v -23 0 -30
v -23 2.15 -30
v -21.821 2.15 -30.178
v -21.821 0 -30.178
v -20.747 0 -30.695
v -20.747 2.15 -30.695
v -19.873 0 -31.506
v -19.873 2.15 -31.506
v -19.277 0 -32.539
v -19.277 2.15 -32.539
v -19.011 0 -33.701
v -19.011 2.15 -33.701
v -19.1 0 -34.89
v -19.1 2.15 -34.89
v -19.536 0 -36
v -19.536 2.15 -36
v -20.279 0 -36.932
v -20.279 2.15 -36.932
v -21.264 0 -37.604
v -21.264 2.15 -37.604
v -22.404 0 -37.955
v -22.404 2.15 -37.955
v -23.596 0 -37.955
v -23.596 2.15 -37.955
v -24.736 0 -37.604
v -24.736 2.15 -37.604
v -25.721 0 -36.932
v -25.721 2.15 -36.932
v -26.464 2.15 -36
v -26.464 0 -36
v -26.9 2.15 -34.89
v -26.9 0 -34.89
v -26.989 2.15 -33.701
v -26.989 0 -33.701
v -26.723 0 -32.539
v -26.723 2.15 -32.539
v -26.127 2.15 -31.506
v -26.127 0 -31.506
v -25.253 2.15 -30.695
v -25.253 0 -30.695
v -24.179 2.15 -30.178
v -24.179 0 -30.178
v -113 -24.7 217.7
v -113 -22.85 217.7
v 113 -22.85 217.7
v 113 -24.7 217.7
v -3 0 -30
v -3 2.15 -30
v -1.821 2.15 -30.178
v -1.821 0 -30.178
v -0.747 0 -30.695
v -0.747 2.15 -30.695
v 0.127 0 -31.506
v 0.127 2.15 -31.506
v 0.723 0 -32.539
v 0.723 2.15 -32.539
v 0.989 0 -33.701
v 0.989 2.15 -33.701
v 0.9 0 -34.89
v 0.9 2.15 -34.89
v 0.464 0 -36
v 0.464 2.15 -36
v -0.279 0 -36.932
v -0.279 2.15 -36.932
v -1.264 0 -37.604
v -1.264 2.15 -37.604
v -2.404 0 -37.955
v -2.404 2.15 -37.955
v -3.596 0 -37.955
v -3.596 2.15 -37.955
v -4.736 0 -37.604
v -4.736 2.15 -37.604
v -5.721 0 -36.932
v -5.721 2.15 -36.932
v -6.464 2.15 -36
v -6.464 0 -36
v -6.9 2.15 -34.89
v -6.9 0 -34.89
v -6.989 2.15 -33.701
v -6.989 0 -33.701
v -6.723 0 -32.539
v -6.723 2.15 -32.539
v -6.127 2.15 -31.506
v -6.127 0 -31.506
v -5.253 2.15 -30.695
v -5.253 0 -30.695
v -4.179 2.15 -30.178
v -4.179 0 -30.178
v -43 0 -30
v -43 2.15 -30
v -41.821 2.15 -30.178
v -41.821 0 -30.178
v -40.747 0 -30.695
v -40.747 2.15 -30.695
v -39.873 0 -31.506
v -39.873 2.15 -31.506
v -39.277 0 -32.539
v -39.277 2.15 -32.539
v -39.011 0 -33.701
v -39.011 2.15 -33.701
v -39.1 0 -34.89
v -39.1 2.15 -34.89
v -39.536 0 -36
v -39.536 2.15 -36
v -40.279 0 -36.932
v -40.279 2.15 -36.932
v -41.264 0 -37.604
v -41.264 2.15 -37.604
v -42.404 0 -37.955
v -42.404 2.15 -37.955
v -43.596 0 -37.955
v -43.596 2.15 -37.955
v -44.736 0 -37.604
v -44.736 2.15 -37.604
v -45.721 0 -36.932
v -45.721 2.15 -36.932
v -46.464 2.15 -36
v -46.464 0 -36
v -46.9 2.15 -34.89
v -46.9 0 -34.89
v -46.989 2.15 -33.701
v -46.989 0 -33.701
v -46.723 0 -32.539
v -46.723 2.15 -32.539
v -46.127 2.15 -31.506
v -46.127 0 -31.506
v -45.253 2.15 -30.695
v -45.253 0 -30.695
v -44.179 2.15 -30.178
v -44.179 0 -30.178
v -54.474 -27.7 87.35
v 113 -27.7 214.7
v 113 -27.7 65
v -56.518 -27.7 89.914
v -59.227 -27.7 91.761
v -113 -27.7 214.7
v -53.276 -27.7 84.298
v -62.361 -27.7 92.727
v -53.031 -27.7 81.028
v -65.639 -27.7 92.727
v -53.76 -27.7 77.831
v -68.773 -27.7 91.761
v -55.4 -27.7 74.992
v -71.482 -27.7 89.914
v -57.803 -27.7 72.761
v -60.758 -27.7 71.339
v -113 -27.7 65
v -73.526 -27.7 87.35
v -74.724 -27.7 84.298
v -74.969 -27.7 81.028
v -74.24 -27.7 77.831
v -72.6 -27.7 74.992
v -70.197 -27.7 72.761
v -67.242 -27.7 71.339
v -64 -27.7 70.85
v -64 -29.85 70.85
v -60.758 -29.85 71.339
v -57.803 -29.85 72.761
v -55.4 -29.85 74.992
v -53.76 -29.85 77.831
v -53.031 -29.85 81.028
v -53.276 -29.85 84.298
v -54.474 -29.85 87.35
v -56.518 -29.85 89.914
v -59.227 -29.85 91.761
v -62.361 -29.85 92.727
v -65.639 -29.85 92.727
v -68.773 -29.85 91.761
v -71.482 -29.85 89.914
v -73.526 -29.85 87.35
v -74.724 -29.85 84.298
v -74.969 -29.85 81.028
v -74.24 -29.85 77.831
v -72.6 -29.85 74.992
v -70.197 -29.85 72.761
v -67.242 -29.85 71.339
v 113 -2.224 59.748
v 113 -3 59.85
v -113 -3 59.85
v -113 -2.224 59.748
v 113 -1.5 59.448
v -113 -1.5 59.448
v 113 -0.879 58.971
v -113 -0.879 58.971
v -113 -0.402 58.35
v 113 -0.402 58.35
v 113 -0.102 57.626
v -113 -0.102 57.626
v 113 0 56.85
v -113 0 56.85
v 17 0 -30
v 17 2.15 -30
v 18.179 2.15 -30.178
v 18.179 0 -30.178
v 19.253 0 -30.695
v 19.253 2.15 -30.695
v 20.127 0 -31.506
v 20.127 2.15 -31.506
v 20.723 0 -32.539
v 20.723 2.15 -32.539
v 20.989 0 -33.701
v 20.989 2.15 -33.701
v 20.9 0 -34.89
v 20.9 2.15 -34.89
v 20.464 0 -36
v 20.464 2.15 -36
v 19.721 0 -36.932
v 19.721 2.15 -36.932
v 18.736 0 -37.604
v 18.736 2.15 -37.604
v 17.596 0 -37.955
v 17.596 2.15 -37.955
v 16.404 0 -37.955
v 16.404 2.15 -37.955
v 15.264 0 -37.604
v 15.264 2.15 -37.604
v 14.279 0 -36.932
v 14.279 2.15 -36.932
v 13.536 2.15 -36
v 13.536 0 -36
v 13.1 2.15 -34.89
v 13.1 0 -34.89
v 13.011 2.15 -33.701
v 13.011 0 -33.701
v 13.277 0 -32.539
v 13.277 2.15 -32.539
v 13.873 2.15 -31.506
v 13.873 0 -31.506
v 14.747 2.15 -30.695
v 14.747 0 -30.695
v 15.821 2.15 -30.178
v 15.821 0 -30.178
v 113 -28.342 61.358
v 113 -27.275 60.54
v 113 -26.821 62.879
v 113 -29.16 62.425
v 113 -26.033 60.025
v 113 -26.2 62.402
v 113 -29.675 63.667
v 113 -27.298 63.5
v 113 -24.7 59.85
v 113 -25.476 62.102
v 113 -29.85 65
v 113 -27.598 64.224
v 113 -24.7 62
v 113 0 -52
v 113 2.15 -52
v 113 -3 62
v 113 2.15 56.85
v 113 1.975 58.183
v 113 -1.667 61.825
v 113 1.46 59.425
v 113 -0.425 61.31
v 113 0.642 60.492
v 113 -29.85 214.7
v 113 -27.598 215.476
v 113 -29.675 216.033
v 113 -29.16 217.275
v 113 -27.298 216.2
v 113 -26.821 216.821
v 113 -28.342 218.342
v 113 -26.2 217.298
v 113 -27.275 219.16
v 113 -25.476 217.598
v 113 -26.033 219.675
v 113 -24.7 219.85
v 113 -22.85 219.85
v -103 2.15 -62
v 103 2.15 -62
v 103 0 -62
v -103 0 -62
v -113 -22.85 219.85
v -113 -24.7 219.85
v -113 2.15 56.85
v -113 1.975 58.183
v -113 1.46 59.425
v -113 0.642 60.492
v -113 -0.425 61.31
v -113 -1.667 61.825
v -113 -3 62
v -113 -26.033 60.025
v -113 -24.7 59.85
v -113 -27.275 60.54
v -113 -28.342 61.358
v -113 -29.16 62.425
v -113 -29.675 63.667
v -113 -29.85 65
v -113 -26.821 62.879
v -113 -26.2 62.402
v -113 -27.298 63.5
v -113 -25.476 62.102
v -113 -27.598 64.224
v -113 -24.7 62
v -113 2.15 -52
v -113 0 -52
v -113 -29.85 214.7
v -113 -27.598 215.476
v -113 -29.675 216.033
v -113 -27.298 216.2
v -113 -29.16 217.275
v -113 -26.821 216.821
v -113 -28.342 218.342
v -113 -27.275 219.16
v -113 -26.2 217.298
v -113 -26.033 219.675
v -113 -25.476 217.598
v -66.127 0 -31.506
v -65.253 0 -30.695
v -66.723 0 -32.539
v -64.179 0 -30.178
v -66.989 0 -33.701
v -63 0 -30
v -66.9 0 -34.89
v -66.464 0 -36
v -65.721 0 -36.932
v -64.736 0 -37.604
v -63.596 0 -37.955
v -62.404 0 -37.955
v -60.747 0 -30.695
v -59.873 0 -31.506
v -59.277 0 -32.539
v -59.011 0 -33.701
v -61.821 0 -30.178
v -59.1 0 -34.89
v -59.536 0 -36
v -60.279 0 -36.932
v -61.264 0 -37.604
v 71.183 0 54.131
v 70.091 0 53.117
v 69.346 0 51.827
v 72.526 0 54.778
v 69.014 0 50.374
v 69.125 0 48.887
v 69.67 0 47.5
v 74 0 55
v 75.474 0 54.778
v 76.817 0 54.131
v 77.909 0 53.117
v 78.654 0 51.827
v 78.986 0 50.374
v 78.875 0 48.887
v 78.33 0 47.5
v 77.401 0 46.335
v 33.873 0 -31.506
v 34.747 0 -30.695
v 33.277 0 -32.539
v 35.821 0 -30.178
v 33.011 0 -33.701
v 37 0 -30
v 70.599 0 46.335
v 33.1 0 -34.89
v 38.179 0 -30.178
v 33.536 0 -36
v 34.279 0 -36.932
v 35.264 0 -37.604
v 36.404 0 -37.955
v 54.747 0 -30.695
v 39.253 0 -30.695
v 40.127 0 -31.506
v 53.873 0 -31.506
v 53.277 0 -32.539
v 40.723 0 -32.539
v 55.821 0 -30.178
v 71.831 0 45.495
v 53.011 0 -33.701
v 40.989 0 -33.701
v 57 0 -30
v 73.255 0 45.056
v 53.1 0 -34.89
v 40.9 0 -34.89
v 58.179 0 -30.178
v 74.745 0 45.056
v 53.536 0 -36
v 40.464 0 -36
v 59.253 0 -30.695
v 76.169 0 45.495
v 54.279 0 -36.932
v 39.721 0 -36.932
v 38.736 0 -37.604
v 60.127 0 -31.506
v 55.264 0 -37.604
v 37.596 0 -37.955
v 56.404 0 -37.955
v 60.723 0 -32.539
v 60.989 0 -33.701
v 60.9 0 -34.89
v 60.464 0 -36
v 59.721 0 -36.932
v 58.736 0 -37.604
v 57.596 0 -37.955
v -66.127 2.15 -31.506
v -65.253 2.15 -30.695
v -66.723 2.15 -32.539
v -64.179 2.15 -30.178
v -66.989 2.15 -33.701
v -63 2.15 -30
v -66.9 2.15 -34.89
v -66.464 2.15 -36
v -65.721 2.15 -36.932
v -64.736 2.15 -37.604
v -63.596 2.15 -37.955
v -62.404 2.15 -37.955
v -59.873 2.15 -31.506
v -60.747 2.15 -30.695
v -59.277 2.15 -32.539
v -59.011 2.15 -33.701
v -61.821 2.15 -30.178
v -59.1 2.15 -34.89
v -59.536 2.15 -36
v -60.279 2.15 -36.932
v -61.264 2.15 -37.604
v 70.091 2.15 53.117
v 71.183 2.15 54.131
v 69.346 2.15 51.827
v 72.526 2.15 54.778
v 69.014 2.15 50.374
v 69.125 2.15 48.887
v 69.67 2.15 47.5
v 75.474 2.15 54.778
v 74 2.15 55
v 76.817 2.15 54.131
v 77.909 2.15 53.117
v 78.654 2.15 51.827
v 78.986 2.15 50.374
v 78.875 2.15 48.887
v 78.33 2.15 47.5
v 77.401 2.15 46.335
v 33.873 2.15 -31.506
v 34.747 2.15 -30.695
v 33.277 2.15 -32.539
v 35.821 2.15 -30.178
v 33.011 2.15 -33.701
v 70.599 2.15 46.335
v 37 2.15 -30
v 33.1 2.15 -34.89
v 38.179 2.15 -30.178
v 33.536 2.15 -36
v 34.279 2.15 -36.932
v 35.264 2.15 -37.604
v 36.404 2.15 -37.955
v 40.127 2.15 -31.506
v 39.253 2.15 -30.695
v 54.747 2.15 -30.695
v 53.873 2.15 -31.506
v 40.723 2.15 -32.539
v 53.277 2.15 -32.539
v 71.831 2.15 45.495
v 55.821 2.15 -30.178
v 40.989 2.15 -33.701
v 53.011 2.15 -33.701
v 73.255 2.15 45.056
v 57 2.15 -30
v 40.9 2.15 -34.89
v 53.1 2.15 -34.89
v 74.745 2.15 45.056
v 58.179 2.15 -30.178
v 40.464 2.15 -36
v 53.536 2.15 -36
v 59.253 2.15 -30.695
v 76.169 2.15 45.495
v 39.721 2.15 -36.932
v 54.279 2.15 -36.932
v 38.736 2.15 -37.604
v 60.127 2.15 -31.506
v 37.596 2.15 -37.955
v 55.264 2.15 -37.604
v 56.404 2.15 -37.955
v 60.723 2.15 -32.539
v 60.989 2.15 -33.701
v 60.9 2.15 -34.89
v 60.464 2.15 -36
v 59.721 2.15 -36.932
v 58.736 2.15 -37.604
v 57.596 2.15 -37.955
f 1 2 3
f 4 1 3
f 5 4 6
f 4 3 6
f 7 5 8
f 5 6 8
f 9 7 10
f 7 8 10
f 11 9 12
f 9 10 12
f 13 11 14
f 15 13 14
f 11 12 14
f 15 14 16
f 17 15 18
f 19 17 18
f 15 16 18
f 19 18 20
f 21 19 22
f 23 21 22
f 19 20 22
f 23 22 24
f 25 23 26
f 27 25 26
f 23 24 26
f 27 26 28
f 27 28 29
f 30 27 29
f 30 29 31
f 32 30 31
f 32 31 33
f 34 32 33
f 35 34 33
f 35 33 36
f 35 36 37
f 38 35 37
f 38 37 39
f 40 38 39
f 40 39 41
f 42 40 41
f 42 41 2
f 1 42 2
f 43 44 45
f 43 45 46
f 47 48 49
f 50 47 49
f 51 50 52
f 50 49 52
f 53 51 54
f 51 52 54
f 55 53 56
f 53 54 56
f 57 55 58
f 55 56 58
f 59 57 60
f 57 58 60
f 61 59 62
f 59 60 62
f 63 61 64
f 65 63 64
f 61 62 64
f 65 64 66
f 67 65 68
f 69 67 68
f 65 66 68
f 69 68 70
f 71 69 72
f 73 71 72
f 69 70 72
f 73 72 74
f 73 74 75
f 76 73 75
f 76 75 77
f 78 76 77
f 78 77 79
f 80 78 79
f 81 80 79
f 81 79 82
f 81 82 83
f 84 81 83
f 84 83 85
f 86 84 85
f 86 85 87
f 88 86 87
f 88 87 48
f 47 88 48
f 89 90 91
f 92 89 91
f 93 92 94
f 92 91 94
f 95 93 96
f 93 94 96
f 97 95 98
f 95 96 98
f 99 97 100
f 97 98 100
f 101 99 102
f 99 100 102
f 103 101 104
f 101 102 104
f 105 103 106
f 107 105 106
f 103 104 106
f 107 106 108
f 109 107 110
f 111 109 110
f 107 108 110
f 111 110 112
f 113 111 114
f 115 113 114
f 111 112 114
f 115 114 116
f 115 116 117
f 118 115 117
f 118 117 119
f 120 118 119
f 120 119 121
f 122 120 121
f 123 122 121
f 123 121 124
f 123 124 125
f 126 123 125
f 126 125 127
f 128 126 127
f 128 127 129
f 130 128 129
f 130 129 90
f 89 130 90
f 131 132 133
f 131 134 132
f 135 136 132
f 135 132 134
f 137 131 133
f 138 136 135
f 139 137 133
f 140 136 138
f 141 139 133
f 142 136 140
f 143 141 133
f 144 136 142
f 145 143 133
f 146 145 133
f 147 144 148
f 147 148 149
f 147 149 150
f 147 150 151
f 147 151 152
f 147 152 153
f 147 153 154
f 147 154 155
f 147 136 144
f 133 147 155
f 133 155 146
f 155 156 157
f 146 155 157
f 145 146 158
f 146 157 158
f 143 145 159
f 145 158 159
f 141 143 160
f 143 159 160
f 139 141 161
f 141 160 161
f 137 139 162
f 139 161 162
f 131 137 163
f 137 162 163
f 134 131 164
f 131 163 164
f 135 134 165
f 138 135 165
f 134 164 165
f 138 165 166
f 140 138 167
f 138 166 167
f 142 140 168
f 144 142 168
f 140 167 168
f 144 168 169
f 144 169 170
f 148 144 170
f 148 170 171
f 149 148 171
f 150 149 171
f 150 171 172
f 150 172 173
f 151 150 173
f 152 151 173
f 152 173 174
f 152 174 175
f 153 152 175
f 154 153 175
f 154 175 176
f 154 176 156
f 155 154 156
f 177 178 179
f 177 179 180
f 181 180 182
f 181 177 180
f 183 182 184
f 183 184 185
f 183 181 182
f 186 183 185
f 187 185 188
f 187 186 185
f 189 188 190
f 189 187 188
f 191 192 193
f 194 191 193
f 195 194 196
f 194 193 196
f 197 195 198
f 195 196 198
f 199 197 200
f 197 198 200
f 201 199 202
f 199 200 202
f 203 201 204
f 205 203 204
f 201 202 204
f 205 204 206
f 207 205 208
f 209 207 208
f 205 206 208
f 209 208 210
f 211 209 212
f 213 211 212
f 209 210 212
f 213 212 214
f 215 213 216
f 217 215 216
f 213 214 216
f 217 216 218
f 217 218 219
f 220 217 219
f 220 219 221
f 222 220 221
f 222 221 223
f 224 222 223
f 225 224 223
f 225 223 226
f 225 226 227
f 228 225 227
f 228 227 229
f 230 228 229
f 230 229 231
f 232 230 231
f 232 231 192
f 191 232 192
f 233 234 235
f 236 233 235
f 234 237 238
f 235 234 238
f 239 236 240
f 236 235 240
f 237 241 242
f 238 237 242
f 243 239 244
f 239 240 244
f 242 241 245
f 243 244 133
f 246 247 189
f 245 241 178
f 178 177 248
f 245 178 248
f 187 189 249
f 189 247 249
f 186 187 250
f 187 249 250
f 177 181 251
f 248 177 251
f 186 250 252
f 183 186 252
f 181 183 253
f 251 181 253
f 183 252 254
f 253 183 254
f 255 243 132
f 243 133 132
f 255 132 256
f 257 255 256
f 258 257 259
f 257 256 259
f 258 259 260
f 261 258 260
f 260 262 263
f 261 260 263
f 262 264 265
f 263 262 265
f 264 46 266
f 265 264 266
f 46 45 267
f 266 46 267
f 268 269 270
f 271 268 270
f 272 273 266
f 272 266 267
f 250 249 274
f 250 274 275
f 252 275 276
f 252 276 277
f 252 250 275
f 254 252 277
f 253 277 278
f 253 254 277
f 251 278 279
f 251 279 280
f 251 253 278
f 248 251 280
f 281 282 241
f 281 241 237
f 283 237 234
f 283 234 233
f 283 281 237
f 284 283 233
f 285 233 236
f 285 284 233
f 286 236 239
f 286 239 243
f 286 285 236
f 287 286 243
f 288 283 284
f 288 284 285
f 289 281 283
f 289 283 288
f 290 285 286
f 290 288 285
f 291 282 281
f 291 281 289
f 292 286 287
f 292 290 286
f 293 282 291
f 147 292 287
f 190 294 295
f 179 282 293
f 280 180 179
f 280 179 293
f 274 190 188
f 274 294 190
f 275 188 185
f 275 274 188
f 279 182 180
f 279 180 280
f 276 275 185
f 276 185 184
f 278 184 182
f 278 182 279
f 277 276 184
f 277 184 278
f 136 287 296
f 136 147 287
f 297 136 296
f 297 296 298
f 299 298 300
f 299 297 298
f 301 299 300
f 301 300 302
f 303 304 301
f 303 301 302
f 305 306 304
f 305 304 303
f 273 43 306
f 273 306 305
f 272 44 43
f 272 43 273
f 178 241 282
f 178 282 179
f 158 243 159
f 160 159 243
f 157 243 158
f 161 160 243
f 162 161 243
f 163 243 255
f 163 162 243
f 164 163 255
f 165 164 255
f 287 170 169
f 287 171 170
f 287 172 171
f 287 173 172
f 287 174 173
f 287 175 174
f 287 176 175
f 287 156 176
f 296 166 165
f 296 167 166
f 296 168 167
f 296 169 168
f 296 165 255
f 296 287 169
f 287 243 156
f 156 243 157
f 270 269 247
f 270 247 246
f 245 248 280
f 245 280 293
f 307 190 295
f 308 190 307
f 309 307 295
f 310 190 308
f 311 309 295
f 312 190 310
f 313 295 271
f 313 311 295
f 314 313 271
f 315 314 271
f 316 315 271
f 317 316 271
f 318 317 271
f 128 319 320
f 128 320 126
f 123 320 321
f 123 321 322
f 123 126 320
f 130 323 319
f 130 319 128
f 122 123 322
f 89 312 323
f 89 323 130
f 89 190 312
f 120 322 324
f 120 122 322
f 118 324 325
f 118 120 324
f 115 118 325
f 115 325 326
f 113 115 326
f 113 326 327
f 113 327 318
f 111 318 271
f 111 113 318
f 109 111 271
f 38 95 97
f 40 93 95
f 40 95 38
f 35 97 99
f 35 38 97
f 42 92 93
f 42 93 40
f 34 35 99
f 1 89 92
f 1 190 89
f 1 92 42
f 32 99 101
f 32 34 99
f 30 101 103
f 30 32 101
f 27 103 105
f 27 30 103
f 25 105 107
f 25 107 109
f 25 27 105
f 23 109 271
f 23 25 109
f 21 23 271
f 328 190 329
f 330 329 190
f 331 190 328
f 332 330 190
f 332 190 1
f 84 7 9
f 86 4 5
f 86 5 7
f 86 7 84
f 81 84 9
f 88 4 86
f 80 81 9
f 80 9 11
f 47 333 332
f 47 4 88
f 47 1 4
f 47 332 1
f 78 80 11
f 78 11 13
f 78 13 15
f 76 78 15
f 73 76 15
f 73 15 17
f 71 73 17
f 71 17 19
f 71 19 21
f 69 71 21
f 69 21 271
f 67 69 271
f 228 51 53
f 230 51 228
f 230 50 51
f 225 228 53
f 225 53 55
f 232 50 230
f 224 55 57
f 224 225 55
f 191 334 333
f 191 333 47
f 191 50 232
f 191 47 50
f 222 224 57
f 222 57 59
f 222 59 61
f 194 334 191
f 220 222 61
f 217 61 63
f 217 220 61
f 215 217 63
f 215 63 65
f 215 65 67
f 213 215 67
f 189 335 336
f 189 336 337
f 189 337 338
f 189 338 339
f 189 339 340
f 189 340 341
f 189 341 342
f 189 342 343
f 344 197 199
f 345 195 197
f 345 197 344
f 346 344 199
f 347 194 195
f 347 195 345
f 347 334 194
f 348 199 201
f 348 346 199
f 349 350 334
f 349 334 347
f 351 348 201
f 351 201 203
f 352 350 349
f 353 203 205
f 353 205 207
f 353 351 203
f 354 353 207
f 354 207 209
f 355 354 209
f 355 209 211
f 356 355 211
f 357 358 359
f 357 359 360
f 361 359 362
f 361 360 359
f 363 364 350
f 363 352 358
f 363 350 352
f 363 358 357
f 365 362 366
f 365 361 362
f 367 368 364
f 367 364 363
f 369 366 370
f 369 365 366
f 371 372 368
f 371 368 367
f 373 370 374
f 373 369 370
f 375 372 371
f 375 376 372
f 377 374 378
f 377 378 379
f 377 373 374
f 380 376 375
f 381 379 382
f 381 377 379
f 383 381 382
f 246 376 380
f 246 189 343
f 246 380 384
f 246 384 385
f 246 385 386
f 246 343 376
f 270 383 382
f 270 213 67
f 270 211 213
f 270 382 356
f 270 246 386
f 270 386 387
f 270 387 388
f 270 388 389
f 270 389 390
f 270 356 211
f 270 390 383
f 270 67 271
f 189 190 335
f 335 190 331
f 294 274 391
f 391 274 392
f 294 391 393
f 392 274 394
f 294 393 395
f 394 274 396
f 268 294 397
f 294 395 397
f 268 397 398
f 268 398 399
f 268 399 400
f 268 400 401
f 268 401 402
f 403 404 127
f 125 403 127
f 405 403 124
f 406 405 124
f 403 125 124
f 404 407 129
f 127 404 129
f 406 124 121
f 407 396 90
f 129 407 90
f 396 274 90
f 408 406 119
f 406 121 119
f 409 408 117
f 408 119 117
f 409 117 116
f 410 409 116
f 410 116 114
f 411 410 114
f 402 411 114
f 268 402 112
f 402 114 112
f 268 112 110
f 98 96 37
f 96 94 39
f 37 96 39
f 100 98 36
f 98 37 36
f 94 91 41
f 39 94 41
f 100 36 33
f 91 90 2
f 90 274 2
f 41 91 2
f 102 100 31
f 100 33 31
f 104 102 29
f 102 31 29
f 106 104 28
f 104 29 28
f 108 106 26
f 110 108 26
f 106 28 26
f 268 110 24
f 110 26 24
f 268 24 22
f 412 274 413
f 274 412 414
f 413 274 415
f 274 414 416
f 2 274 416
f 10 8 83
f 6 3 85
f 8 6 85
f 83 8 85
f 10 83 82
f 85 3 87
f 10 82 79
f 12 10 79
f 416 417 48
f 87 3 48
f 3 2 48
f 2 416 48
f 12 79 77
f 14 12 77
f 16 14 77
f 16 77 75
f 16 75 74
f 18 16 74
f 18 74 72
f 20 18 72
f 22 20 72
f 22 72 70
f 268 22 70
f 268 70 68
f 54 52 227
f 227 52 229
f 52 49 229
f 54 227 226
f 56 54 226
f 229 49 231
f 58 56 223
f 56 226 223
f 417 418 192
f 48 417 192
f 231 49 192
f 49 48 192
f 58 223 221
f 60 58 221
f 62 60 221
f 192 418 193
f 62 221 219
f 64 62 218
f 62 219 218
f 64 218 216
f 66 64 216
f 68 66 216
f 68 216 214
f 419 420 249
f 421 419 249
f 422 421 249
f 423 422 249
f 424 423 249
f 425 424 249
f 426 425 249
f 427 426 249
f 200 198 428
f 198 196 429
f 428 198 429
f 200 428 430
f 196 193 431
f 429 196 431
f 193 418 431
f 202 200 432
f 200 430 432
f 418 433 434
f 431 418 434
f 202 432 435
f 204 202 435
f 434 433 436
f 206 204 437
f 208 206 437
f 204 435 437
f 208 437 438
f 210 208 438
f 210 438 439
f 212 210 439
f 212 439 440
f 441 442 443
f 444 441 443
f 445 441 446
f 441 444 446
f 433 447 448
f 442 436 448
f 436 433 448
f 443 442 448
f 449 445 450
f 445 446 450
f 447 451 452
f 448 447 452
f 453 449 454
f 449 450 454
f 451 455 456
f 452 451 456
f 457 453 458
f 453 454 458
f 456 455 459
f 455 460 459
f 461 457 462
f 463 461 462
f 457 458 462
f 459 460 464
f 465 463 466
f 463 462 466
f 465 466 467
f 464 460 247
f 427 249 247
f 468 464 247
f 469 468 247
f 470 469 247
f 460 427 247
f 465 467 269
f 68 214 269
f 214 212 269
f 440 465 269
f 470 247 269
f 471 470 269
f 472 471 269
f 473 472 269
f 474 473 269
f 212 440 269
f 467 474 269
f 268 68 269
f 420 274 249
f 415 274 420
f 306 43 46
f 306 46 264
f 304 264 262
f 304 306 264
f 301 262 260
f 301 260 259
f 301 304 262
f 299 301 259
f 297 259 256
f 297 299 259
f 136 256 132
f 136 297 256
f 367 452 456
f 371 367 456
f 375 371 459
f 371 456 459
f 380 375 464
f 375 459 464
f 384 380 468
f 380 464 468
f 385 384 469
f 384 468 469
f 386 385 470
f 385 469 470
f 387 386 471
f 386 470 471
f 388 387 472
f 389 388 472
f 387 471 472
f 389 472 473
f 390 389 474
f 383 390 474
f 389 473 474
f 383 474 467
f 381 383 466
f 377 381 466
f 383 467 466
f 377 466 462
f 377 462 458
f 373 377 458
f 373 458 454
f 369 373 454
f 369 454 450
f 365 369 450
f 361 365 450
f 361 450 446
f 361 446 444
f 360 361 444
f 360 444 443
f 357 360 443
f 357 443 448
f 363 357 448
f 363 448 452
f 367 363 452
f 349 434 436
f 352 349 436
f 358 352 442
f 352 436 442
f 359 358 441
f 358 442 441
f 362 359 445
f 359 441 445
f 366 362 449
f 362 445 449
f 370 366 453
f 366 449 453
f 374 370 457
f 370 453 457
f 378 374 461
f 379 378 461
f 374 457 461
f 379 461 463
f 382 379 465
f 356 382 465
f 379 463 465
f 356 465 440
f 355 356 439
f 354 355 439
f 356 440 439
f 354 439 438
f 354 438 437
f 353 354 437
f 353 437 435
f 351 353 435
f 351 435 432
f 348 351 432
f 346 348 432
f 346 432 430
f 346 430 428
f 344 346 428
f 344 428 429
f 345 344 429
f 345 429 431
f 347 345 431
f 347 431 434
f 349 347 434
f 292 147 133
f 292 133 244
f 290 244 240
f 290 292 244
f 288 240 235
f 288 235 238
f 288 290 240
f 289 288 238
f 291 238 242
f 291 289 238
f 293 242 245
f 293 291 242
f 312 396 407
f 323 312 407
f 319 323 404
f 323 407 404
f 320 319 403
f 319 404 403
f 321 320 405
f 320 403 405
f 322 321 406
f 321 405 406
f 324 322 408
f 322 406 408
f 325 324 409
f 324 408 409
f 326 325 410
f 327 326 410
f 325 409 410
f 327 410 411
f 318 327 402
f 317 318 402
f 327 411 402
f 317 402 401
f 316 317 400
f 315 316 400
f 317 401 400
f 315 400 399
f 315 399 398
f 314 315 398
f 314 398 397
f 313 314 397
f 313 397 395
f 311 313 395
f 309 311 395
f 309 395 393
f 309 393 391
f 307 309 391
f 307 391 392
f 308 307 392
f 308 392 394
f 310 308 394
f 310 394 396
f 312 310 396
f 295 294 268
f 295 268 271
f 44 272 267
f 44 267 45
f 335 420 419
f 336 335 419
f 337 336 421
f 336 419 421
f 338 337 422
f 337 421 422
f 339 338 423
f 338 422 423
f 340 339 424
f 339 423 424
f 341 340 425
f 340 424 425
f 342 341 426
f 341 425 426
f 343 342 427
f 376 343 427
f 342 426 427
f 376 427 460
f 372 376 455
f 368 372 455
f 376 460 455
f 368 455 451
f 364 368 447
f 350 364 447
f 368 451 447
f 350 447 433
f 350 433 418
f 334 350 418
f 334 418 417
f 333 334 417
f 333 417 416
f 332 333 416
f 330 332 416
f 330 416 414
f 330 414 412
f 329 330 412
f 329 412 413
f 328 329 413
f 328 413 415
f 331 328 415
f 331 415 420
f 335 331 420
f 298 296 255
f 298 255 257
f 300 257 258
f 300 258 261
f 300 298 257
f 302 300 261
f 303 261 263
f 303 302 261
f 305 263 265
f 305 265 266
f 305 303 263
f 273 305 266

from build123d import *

# Parameters (mm, degrees)
SKETCH1_W                    = 2.15
SKETCH1_H                    = 124
BASE_FLANGE1_DEPTH           = 113
CHAMFER1_SIZE                = 10
EDGE_FLANGE1_STRIP_W         = 14.6
EDGE_FLANGE1_STRIP_H         = 2.15
EDGE_FLANGE1_STRIP_CUT_DEPTH = 226
EDGE_FLANGE1_DEPTH           = 226
EDGE_FLANGE2_STRIP_W         = 14.6
EDGE_FLANGE2_STRIP_H         = 2.15
EDGE_FLANGE2_STRIP_CUT_DEPTH = 226
EDGE_FLANGE2_DEPTH           = 226
EDGE_FLANGE3_STRIP_W         = 14.6
EDGE_FLANGE3_STRIP_H         = 2.15
EDGE_FLANGE3_STRIP_CUT_DEPTH = 226
EDGE_FLANGE3_DEPTH           = 226
SKETCH15_R                   = 11
CUT_EXTRUDE1_DEPTH           = 250.252928769
SKETCH16_R                   = 4
CUT_EXTRUDE2_DEPTH           = 250.252928769
LPATTERN1_COUNT              = 7
LPATTERN1_PITCH              = 20
SKETCH17_R                   = 5
CUT_EXTRUDE3_DEPTH           = 250.252928769


# Sheet-metal steps are written as plain solids
with BuildPart() as part:
    # Sketch1 → Base-Flange1 (new, symmetric)
    with BuildSketch(Plane(origin=(0, 0, 0), x_dir=(0, -1, 0), z_dir=(1, 0, 0))):
        with Locations((-1.075, 0)):
            Rectangle(SKETCH1_W, SKETCH1_H)
    extrude(amount=BASE_FLANGE1_DEPTH, both=True)

    # Chamfer1
    chamfer1_edges = [part.edges().sort_by_distance(p)[0] for p in [
        (113, 1.075, -62),
        (-113, 1.075, -62),
    ]]
    chamfer(chamfer1_edges, length=CHAMFER1_SIZE)

    # Edge-Flange1 strip (across the edge) → Edge-Flange1 strip cut (cut)
    with BuildSketch(Plane(origin=(113, 0, 62), x_dir=(0, 0, -1), z_dir=(-1, 0, 0))):
        with Locations((-2.15, -1.075)):
            Rectangle(EDGE_FLANGE1_STRIP_W, EDGE_FLANGE1_STRIP_H)
    extrude(amount=EDGE_FLANGE1_STRIP_CUT_DEPTH, mode=Mode.SUBTRACT)

    # Edge-Flange1 section (across the edge) → Edge-Flange1 (add)
    with BuildSketch(Plane(origin=(113, 0, 62), x_dir=(0, 0, -1), z_dir=(-1, 0, 0))):
        with BuildLine():
            Line((0, 3), (0, 29.85))
            Line((0, 29.85), (2.15, 29.85))
            Line((2.15, 29.85), (2.15, 3))
            ThreePointArc((2.15, 3), (3.028679656, 0.878679656), (5.15, 0))
            Line((5.15, 0), (5.15, -2.15))
            ThreePointArc((5.15, -2.15), (1.508400077, -0.641599923), (0, 3))
        make_face()
    extrude(amount=EDGE_FLANGE1_DEPTH)

    # Edge-Flange2 strip (across the edge) → Edge-Flange2 strip cut (cut)
    with BuildSketch(Plane(origin=(-113, -29.85, 62), x_dir=(0, 1, 0), z_dir=(1, 0, 0))):
        with Locations((-2.15, -1.075)):
            Rectangle(EDGE_FLANGE2_STRIP_W, EDGE_FLANGE2_STRIP_H)
    extrude(amount=EDGE_FLANGE2_STRIP_CUT_DEPTH, mode=Mode.SUBTRACT)

    # Edge-Flange2 section (across the edge) → Edge-Flange2 (add)
    with BuildSketch(Plane(origin=(-113, -29.85, 62), x_dir=(0, 1, 0), z_dir=(1, 0, 0))):
        with BuildLine():
            Line((0, 3), (0, 157.85))
            Line((0, 157.85), (2.15, 157.85))
            Line((2.15, 157.85), (2.15, 3))
            ThreePointArc((2.15, 3), (3.028679656, 0.878679656), (5.15, 0))
            Line((5.15, 0), (5.15, -2.15))
            ThreePointArc((5.15, -2.15), (1.508400077, -0.641599923), (0, 3))
        make_face()
    extrude(amount=EDGE_FLANGE2_DEPTH)

    # Edge-Flange3 strip (across the edge) → Edge-Flange3 strip cut (cut)
    with BuildSketch(Plane(origin=(-113, -27.7, 219.85), x_dir=(0, 0, -1), z_dir=(1, 0, 0))):
        with Locations((-2.15, -1.075)):
            Rectangle(EDGE_FLANGE3_STRIP_W, EDGE_FLANGE3_STRIP_H)
    extrude(amount=EDGE_FLANGE3_STRIP_CUT_DEPTH, mode=Mode.SUBTRACT)

    # Edge-Flange3 section (across the edge) → Edge-Flange3 (add)
    with BuildSketch(Plane(origin=(-113, -27.7, 219.85), x_dir=(0, 0, -1), z_dir=(1, 0, 0))):
        with BuildLine():
            Line((0, 3), (0, 4.85))
            Line((0, 4.85), (2.15, 4.85))
            Line((2.15, 4.85), (2.15, 3))
            ThreePointArc((2.15, 3), (3.028679656, 0.878679656), (5.15, 0))
            Line((5.15, 0), (5.15, -2.15))
            ThreePointArc((5.15, -2.15), (1.508400077, -0.641599923), (0, 3))
        make_face()
    extrude(amount=EDGE_FLANGE3_DEPTH)

    # Sketch15 → Cut-Extrude1 (cut, through all)
    with BuildSketch(Plane.XZ.offset(29.85)):
        with Locations(Location((-64, 81.85, 0), (0, 0, 270))):
            Circle(SKETCH15_R)
    extrude(amount=-CUT_EXTRUDE1_DEPTH, mode=Mode.SUBTRACT)

    # Sketch16 → Cut-Extrude2 (cut, through all)
    with BuildSketch(Plane(origin=(0, 2.15, 0), x_dir=(1, 0, 0), z_dir=(0, 1, 0))):
        with Locations(Location((-63, 34, 0), (0, 0, 270))):
            Circle(SKETCH16_R)
    cut_extrude2 = extrude(amount=-CUT_EXTRUDE2_DEPTH, mode=Mode.SUBTRACT)

    # LPattern1: Cut-Extrude2 ×7
    with Locations(*[(i * LPATTERN1_PITCH, 0, 0) for i in range(1, LPATTERN1_COUNT)]):
        add(cut_extrude2, mode=Mode.SUBTRACT)

    # Sketch17 → Cut-Extrude3 (cut, through all)
    with BuildSketch(Plane(origin=(0, 2.15, 0), x_dir=(1, 0, 0), z_dir=(0, 1, 0))):
        with Locations(Location((74, -50, 0), (0, 0, 270))):
            Circle(SKETCH17_R)
    extrude(amount=-CUT_EXTRUDE3_DEPTH, mode=Mode.SUBTRACT)


solid = part.part
